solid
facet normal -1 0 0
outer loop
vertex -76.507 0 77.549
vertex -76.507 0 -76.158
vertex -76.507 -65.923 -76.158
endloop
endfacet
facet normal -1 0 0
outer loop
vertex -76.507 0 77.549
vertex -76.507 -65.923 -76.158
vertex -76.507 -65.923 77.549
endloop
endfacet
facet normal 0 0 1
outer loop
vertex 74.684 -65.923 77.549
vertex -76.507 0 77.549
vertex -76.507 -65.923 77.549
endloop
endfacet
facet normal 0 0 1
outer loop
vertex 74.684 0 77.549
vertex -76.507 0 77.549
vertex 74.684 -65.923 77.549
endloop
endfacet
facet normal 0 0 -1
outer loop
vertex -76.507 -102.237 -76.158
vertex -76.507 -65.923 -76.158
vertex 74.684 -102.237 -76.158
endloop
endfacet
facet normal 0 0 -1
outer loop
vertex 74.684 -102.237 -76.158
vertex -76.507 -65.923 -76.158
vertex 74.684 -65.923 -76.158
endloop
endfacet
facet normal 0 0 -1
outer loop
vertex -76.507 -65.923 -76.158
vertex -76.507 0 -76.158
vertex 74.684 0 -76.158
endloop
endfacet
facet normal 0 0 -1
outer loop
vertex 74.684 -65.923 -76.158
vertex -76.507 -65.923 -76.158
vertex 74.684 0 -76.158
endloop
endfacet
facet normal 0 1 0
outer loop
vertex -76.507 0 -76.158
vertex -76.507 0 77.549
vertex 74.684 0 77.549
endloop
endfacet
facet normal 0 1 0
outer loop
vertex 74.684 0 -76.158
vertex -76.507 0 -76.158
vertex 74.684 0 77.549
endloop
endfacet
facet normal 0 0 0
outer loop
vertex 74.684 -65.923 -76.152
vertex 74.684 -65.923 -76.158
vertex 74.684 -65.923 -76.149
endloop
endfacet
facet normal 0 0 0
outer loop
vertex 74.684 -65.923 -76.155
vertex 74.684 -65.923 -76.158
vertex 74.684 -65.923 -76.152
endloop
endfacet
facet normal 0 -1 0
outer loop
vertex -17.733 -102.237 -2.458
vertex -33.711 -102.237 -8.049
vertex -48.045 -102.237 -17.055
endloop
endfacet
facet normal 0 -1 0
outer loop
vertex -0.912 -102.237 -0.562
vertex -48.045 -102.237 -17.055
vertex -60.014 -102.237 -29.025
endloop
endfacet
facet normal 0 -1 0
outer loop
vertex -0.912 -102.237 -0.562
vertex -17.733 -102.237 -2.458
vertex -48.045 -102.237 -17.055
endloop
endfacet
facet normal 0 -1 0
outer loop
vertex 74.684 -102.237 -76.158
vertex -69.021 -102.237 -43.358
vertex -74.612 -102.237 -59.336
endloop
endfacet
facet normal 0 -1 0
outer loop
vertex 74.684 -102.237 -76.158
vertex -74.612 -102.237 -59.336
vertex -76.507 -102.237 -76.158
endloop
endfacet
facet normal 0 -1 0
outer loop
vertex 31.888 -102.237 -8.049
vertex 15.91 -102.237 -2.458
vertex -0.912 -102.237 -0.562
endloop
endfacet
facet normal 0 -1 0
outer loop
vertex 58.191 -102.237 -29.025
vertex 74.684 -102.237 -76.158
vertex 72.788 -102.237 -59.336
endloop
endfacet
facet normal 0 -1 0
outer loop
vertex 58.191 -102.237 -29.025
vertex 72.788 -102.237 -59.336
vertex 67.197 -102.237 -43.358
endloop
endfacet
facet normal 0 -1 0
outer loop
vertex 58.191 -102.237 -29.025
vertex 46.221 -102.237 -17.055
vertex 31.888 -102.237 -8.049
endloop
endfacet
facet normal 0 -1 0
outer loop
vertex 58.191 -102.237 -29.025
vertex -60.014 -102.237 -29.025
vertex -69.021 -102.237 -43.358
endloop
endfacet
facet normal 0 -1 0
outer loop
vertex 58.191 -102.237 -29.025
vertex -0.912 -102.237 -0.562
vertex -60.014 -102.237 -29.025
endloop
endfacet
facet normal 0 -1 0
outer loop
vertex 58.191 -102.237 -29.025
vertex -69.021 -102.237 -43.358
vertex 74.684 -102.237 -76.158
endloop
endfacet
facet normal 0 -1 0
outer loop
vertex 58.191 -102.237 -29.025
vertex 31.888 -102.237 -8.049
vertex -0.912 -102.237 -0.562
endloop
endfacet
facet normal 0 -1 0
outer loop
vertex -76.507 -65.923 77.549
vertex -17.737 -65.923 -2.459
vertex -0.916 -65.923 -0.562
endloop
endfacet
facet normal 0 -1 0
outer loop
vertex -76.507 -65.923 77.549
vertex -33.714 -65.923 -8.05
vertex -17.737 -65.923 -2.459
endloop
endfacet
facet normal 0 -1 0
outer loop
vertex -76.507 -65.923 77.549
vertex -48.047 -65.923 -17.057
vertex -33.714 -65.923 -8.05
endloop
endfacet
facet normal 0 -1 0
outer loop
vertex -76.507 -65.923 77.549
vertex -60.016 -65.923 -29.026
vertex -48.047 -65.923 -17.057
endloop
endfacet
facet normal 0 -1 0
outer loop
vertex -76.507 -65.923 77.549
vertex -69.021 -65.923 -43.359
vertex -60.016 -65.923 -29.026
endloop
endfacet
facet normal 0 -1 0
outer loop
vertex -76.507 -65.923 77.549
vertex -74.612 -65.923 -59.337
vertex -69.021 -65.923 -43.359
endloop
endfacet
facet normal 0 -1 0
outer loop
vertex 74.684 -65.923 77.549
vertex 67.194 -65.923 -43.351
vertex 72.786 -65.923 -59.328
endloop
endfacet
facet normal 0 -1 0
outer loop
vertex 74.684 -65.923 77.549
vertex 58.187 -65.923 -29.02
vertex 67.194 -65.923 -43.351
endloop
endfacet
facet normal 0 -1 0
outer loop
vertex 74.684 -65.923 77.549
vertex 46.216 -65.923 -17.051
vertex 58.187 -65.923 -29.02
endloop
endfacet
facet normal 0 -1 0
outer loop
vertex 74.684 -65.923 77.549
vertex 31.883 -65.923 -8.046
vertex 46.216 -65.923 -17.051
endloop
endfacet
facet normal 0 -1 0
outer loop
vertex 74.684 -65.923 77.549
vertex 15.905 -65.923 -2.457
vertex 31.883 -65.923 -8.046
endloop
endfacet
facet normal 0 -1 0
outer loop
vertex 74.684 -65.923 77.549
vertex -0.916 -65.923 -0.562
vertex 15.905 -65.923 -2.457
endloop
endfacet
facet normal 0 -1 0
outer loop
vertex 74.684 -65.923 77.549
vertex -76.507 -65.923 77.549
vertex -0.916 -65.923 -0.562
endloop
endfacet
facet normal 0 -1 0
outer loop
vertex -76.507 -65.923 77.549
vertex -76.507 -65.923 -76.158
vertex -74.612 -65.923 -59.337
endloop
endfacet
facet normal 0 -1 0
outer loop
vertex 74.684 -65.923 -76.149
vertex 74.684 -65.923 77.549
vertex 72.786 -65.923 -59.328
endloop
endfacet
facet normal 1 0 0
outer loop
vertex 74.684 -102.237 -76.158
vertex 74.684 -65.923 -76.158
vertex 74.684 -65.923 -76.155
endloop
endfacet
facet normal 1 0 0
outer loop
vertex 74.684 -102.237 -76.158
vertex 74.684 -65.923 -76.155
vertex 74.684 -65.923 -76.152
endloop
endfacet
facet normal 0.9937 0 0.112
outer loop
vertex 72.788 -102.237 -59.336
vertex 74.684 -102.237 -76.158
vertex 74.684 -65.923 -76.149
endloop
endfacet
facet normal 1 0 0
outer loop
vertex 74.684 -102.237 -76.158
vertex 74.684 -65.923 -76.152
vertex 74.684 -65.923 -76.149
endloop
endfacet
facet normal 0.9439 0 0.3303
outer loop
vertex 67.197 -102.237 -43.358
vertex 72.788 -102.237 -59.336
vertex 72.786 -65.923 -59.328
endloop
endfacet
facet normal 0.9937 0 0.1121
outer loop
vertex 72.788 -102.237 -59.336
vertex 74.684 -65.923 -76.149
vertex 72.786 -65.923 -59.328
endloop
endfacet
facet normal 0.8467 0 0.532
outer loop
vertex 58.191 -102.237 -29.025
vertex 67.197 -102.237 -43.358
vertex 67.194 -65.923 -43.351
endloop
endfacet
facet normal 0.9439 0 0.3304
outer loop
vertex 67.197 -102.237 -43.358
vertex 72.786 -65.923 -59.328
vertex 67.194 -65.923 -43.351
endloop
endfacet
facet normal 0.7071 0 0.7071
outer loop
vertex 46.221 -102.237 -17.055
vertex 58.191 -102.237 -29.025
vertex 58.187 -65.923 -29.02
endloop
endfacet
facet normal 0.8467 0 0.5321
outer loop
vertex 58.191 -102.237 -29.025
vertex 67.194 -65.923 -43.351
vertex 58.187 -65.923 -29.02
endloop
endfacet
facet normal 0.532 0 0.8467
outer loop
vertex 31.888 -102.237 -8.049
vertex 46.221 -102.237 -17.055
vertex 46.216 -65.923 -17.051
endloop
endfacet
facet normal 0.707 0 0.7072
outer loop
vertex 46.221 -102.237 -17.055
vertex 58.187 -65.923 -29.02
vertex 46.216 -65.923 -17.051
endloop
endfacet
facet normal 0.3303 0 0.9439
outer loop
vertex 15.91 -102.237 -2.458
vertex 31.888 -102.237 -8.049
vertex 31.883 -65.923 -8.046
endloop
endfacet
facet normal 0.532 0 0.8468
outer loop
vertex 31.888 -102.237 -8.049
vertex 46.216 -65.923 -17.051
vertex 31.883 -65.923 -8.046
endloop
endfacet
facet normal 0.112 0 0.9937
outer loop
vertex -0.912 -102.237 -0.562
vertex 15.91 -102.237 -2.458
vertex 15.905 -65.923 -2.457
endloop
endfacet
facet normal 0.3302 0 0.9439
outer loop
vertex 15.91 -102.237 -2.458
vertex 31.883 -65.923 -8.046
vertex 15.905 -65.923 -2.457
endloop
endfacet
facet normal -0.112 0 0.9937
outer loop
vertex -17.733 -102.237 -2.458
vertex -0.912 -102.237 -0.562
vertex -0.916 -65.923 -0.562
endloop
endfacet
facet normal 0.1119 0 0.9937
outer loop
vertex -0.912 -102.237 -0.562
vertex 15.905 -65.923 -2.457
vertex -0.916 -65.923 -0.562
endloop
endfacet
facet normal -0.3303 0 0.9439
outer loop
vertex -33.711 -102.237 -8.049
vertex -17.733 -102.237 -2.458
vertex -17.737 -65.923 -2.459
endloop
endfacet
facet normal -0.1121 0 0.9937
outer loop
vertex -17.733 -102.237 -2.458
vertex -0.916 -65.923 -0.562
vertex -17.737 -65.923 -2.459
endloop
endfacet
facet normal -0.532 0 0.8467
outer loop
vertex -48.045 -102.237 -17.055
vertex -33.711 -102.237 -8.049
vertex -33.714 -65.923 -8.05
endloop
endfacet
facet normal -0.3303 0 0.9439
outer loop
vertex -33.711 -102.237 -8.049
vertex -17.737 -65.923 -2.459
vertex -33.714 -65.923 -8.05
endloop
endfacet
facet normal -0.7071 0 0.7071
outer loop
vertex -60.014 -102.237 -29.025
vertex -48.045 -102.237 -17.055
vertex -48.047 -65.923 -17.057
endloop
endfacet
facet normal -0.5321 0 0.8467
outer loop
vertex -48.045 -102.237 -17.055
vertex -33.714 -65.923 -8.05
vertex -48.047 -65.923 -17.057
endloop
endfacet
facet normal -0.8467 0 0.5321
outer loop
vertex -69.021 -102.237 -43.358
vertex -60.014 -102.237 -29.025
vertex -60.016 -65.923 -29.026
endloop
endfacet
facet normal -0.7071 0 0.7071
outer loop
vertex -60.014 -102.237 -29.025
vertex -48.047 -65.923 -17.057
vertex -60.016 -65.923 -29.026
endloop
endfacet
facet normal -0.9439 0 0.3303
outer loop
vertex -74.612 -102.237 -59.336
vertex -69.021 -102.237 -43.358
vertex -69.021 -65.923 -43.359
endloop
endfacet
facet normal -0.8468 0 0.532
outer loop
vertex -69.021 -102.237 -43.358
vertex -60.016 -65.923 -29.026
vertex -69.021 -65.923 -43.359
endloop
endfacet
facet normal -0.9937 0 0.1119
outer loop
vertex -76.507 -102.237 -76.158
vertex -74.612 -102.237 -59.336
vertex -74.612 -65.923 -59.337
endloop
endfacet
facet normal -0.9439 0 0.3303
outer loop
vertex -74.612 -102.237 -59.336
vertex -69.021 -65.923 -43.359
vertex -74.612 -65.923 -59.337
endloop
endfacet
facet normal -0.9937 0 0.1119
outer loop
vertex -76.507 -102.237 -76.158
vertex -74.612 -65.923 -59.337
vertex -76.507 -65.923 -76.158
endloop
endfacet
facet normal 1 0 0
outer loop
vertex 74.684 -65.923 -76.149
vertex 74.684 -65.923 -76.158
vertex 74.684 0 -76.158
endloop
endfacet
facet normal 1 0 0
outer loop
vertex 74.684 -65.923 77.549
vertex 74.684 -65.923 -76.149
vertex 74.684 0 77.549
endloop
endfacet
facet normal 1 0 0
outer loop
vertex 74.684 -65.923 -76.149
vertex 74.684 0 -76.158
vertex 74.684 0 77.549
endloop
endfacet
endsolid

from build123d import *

# Parameters (mm, degrees)
F0_W     = 151.190631
F0_H     = 153.706558
F1_DEPTH = 65.923417
F3_DEPTH = 36.313294


with BuildPart() as f1:
    # F0 (on Front) → F1 (new body)
    with BuildSketch(Plane.XZ):
        with Locations((-0.911687, 0.695508)):
            Rectangle(F0_W, F0_H)
    extrude(amount=F1_DEPTH)

    # F2 (on face) → F3 (join)
    with BuildSketch(Plane.XZ.offset(65.923417)):
        with BuildLine():
            Line((-76.507002, -76.157771), (74.683629, -76.157771))
            ThreePointArc((74.683629, -76.157771), (-0.911687, -0.562456), (-76.507002, -76.157771))
        make_face()
    extrude(amount=F3_DEPTH)


solid = f1.part
